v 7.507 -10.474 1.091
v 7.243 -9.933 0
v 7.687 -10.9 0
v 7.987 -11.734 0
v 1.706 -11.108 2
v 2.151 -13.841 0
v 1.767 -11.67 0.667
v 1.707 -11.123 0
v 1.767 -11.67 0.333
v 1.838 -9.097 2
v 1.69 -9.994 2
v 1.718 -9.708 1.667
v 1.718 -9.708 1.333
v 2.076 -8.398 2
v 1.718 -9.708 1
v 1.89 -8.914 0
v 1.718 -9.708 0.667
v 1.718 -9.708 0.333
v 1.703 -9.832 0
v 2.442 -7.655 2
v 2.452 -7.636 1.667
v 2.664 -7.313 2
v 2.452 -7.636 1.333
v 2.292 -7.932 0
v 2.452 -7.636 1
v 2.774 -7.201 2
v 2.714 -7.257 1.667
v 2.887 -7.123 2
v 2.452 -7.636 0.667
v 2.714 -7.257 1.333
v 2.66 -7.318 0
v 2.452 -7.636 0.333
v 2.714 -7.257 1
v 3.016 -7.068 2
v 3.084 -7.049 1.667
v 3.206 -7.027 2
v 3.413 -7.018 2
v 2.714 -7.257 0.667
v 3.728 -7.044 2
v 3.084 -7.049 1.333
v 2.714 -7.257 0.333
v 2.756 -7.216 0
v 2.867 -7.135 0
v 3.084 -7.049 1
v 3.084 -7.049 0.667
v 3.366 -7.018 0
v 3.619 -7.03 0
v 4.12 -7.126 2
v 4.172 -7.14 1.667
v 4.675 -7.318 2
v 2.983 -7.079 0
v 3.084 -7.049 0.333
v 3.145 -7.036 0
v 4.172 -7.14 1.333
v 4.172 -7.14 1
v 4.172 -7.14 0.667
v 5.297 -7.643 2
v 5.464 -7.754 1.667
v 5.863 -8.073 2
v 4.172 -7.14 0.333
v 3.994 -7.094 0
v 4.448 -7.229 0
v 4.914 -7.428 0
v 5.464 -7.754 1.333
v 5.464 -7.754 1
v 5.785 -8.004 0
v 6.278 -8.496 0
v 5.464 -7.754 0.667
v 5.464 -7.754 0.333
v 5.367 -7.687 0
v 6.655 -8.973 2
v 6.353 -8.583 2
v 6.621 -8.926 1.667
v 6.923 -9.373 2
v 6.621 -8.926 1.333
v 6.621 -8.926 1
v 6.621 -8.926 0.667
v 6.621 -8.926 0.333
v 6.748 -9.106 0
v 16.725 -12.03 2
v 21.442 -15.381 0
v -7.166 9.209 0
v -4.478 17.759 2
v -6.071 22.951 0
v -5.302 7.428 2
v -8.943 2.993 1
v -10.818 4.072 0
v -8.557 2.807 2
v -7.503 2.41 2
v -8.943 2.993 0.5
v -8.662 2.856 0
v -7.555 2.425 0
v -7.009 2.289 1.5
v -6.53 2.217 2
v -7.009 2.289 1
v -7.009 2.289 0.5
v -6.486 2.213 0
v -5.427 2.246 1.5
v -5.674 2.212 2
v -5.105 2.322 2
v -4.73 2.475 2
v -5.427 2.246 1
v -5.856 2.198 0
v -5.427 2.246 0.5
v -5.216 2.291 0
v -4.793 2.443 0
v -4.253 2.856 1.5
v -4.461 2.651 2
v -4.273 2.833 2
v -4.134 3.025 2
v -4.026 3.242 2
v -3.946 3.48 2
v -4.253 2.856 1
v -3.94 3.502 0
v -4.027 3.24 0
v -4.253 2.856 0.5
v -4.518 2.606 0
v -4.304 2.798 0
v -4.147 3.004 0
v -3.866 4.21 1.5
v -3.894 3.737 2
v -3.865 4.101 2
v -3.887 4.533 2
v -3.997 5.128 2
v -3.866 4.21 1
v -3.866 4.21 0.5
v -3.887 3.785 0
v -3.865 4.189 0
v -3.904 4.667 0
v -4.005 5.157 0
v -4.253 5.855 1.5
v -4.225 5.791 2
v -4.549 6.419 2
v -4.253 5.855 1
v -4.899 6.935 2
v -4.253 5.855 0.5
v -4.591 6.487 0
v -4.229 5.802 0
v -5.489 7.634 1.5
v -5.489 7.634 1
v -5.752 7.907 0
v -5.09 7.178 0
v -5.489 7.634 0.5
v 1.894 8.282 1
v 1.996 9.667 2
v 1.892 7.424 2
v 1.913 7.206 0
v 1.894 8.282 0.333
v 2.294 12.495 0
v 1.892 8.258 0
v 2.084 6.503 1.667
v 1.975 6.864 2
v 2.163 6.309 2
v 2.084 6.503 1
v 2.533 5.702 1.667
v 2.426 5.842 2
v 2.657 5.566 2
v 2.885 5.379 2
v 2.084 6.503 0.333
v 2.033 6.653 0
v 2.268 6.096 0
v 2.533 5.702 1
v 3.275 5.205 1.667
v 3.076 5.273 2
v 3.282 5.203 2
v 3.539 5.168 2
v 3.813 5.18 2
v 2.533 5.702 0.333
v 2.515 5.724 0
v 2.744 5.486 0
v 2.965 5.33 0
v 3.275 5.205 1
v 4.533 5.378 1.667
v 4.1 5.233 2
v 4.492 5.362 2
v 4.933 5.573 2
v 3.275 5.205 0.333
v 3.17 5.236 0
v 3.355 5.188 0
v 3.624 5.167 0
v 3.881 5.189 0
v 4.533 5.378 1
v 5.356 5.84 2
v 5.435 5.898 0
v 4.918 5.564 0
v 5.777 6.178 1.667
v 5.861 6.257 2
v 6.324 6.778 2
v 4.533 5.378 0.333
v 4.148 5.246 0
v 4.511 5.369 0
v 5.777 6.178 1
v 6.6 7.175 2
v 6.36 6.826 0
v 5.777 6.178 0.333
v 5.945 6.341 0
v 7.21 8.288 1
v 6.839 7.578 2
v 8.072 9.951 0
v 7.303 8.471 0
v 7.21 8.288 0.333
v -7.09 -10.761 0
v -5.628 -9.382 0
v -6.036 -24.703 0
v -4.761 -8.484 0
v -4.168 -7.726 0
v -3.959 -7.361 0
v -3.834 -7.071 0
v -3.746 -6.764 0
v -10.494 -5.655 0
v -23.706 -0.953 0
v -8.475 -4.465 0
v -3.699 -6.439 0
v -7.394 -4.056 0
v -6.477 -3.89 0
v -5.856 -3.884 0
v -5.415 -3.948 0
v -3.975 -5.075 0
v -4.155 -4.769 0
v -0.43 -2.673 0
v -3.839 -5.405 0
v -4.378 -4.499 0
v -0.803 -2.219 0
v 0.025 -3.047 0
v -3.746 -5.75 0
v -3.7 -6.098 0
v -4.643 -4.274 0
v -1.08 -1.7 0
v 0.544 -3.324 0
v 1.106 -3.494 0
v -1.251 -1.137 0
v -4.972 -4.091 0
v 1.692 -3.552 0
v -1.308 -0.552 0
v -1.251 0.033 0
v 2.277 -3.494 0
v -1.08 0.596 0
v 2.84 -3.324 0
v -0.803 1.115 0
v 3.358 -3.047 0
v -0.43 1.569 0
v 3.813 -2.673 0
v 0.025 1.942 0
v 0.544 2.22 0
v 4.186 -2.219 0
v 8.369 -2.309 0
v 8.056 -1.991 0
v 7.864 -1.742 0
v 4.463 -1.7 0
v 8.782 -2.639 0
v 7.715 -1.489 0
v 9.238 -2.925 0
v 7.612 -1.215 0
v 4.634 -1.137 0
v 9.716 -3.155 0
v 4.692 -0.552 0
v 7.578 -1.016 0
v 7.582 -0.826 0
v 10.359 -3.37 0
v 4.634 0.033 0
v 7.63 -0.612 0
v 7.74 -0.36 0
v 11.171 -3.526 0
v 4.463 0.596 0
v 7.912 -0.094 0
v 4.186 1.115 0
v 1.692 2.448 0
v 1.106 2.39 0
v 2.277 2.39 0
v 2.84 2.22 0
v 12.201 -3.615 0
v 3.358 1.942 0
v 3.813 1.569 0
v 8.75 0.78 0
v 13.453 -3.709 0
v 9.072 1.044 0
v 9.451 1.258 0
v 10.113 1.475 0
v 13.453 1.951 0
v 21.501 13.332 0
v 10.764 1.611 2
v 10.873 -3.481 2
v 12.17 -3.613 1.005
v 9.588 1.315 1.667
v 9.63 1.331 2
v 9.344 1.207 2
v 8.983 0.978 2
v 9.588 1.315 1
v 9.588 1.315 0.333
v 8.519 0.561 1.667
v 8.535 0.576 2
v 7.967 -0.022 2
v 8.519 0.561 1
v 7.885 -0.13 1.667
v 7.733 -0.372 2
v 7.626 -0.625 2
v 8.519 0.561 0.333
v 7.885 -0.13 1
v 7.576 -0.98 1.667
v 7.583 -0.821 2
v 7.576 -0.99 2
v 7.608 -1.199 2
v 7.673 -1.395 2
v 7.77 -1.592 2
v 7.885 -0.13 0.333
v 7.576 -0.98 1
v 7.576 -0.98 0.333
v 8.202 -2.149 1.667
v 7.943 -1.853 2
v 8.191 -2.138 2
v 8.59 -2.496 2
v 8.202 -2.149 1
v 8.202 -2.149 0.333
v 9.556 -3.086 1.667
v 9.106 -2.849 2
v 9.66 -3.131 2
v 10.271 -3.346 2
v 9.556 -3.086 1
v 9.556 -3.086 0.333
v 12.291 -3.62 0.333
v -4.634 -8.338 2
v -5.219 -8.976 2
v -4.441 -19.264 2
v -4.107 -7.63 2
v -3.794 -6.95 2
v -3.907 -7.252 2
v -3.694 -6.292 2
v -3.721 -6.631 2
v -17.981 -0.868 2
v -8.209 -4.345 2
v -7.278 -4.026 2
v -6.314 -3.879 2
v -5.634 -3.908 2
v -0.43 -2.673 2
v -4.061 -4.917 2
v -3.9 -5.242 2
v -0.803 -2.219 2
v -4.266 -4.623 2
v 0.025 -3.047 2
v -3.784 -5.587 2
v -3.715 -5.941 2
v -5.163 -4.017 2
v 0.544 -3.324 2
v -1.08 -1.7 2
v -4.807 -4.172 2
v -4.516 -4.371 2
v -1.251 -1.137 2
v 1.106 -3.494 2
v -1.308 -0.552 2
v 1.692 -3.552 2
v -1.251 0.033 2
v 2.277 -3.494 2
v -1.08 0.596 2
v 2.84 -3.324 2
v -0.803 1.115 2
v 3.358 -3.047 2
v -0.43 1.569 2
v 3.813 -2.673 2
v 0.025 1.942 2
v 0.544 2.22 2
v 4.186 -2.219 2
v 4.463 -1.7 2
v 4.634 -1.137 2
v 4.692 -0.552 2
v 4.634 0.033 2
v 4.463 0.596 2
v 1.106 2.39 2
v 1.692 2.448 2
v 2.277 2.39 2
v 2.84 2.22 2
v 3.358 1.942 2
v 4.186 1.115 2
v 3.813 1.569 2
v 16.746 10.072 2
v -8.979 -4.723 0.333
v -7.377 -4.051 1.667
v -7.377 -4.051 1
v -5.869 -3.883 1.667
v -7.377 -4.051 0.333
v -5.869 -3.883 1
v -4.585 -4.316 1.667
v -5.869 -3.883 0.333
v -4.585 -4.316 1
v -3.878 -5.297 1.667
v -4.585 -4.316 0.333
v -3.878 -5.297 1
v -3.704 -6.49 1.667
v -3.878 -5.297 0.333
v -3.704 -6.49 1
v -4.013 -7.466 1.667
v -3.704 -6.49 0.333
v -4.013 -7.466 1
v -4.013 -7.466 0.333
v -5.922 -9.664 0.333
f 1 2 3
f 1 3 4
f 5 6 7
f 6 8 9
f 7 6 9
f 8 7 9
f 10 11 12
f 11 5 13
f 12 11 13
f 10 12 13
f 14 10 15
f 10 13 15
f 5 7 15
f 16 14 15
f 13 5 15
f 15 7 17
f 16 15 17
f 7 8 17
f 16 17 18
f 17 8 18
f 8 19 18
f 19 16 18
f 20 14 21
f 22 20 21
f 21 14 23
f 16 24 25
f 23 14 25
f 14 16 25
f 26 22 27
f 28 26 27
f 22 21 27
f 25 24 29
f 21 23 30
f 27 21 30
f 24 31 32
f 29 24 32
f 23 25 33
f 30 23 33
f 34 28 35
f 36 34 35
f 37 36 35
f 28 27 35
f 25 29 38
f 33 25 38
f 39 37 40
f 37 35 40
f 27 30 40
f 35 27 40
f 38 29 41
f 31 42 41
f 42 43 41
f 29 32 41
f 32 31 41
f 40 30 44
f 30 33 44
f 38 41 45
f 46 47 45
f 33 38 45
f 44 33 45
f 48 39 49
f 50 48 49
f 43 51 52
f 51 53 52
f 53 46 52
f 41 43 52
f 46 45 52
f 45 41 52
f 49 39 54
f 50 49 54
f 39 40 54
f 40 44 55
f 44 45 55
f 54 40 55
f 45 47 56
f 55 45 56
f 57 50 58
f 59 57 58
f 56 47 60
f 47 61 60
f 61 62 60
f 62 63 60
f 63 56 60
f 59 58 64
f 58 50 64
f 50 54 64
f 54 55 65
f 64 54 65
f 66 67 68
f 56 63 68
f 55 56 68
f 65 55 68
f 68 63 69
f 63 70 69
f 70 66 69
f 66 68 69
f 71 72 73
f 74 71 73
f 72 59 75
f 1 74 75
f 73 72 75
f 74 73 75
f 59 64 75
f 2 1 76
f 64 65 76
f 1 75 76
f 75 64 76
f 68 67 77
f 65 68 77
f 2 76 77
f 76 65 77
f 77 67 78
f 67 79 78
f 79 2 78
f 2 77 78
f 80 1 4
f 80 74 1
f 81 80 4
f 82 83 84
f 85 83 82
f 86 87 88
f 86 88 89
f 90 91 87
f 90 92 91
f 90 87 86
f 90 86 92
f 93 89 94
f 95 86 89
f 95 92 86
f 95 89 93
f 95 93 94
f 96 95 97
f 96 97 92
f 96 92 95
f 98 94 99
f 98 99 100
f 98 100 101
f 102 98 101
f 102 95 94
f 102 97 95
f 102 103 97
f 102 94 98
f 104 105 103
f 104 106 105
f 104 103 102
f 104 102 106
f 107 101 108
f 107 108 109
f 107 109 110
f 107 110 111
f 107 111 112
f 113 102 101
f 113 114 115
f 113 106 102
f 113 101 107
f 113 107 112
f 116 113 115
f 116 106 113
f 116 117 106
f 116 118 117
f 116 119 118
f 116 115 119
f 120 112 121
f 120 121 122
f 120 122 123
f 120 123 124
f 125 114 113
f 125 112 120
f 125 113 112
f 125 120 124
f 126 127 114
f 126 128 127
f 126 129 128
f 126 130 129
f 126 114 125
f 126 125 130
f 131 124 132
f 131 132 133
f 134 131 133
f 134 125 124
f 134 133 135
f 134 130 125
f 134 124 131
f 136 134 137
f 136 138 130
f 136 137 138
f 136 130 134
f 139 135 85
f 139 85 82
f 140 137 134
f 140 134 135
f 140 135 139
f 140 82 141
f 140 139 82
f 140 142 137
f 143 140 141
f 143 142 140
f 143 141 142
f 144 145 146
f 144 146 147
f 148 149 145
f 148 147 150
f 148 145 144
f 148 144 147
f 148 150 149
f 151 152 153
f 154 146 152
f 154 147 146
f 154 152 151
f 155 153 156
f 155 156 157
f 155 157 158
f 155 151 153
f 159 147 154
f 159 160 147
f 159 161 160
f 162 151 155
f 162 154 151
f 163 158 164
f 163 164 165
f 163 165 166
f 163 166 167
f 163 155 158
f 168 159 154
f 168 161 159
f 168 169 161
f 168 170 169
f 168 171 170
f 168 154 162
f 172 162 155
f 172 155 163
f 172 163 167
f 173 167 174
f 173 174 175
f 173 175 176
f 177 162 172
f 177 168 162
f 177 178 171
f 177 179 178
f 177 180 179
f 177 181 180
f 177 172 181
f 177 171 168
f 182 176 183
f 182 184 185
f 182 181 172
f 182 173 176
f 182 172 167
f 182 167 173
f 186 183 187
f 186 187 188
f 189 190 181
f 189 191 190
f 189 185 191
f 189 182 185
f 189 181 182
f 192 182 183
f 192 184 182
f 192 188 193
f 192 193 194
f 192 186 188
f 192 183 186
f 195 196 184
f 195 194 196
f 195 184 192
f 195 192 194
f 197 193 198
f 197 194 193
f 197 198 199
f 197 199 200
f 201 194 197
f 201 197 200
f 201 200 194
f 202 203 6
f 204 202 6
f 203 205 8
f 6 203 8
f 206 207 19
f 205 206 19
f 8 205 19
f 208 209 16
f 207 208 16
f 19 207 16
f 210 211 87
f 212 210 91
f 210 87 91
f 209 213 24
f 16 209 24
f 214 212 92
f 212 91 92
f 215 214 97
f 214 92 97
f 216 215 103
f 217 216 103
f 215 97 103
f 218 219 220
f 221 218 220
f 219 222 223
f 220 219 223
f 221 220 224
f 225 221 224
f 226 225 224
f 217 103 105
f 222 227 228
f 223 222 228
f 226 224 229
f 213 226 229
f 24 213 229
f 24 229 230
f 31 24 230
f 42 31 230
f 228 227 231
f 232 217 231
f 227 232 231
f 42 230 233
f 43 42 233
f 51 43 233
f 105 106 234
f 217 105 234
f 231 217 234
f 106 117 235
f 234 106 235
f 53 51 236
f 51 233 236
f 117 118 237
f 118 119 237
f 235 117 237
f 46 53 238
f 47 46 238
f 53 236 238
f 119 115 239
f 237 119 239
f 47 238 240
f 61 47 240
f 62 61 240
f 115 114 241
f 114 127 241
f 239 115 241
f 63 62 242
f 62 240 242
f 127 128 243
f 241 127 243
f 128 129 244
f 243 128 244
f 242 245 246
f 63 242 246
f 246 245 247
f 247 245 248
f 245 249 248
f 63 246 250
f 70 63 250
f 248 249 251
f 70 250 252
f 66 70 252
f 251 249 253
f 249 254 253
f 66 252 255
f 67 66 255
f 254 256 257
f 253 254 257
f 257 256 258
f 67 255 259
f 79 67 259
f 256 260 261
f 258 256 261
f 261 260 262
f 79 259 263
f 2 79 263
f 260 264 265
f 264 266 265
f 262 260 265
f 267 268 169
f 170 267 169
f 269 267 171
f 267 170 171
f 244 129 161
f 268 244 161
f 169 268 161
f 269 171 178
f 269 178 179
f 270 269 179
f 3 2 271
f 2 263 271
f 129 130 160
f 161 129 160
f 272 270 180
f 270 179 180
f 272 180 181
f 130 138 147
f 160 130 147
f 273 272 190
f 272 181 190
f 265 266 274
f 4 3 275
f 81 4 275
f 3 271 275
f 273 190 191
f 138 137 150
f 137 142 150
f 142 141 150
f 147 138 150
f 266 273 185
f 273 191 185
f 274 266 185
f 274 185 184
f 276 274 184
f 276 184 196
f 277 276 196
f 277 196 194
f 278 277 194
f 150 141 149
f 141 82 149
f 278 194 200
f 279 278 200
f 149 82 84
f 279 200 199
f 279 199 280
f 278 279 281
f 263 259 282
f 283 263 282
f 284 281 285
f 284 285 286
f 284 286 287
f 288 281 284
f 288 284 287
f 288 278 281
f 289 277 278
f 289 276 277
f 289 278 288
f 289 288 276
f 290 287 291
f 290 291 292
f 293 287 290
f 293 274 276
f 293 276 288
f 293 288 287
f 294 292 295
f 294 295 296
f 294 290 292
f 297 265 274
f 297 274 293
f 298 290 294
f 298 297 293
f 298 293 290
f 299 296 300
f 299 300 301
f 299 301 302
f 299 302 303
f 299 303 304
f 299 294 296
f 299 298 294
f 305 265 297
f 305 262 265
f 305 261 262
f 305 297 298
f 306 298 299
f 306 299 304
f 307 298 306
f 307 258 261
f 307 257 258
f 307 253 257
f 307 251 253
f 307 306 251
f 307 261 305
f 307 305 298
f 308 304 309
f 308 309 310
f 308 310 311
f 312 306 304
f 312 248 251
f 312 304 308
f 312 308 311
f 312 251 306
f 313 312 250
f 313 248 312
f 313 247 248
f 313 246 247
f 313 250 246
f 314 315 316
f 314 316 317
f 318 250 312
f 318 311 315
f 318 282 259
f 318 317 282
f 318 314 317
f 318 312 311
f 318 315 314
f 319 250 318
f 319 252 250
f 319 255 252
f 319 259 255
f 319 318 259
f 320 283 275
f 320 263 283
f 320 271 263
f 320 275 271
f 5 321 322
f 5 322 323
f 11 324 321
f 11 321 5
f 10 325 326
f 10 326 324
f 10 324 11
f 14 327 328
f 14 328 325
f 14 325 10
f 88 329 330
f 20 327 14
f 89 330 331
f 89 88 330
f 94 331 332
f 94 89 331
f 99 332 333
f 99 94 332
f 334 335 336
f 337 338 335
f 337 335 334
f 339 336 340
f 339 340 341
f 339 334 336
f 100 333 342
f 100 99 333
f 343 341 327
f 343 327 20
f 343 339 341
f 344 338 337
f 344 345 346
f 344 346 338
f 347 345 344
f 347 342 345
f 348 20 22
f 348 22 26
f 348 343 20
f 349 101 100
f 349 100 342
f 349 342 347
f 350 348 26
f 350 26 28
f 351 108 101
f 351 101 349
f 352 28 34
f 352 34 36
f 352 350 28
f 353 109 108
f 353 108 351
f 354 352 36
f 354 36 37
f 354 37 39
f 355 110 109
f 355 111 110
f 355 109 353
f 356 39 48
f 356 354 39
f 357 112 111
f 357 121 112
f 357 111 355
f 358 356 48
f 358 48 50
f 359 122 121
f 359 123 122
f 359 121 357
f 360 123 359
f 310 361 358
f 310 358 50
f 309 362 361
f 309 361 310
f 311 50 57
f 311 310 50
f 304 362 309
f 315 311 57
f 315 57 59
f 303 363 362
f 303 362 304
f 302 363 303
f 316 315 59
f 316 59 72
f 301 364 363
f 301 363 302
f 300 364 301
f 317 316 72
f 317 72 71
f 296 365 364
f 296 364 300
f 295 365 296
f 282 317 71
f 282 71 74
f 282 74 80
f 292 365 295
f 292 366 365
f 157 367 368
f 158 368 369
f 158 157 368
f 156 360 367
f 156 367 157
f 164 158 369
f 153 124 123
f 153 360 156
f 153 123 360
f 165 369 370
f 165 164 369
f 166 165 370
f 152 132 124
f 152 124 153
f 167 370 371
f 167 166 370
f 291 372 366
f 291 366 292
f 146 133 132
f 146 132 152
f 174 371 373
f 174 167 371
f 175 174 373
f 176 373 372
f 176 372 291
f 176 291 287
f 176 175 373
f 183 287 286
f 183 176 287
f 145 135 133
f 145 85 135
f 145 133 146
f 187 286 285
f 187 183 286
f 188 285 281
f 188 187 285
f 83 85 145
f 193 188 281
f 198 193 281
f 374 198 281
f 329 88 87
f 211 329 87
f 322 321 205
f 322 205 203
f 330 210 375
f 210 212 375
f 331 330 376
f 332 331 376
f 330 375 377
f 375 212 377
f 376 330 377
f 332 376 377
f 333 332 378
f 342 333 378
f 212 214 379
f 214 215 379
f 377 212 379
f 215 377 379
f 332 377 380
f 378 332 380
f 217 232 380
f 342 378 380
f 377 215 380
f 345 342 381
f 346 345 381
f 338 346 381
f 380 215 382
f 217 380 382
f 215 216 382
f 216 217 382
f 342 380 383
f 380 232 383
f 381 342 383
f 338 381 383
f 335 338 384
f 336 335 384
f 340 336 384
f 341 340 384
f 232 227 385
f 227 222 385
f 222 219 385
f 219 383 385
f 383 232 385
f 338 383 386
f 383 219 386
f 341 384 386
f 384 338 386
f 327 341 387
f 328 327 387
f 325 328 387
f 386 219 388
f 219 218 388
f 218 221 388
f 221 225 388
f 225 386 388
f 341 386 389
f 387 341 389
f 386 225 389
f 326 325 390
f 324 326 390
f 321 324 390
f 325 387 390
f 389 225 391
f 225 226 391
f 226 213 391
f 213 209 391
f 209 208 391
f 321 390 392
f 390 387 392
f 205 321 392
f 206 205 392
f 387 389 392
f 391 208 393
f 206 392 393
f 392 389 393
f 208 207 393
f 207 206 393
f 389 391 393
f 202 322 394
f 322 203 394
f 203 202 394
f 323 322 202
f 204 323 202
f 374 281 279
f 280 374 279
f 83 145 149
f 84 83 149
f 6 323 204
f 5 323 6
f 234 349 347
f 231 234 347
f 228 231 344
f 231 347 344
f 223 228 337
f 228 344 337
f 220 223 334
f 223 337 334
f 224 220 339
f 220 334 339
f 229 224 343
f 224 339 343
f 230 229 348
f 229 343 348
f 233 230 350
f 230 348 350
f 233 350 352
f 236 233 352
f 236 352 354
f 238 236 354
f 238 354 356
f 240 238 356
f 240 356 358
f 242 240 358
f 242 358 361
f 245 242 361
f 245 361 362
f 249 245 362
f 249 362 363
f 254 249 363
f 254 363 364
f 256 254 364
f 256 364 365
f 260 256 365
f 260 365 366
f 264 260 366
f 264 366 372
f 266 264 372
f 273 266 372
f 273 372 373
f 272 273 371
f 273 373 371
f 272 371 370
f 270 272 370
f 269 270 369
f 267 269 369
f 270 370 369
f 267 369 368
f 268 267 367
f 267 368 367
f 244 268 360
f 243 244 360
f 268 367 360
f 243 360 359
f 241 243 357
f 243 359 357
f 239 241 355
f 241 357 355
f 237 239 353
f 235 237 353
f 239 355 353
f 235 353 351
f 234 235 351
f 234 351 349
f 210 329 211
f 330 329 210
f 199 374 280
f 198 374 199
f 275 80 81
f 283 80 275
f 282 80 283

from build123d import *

# Parameters (mm, degrees)
F1_DEPTH = 2
F2_SIZE  = 1.99999
F4_D     = 6


# Not quite as in the source:
# - a fillet or chamfer is up to 0.001 mm smaller than in the source, because OpenCascade refuses the exact size


with BuildPart() as f1:
    # F0 (on Top) → F1 (new body)
    with BuildSketch(Plane.XY):
        with BuildLine():
            Line((-6.070732047, 22.9513901076), (-7.1661561031, 9.2087939751))
            add(Edge.make_bspline(
                [(-10.8183338371, 4.072241369), (-9.5749830205, 3.3108681768), (-7.3147246833, 1.9267856777), (-3.6193330593, 2.323879706), (-3.8736126343, 6.3110586072), (-5.9992796786, 8.181837424), (-7.1661561031, 9.2087939751)],
                knots=[0, 0, 0, 0, 0.2710094176, 0.4926616748, 0.721498655, 1, 1, 1, 1], degree=3))
            Line((-10.8183338371, 4.072241369), (-23.7063266087, -0.9532651191))
            Line((-23.7063266087, -0.9532651191), (-10.4941075873, -5.6545452478))
            add(Edge.make_bspline(
                [(-10.4941075873, -5.6545452478), (-9.4938612527, -5.0046237284), (-7.5990391104, -3.7734413255), (-4.2858275376, -3.7917280391), (-3.3433653275, -6.5786033893), (-4.5476101592, -8.3403208195), (-5.9073550155, -9.6570884675), (-6.7070025438, -10.4037433444), (-7.0897310874, -10.7611084628)],
                knots=[0, 0, 0, 0, 0.2047671487, 0.3879017737, 0.5554252257, 0.7107538026, 0.8615605352, 1, 1, 1, 1], degree=3))
            Line((-7.0897310874, -10.7611084628), (-6.0359964333, -24.702837204))
            Line((-6.0359964333, -24.702837204), (2.1507161547, -13.8412582744))
            add(Edge.make_bspline(
                [(2.1507161547, -13.8412582744), (1.857437852, -12.3709258177), (1.3508773092, -9.8313161697), (2.3957995803, -7.6684734808), (3.0110019697, -6.7670125475), (5.8159743775, -7.4801379246), (7.4501009355, -10.1557150048), (7.8283613318, -11.2679488073), (7.9867886511, -11.7337872122)],
                knots=[0, 0, 0, 0, 0.2247705341, 0.3882315284, 0.4906474402, 0.664362762, 0.8594245965, 1, 1, 1, 1], degree=3))
            Line((7.9867886511, -11.7337872122), (21.4421775791, -15.3813331802))
            Line((21.4421775791, -15.3813331802), (13.4529346897, -3.7091881875))
            add(Edge.make_bspline(
                [(13.4529346897, 1.9505254996), (11.9323407983, 1.79071702), (9.5330178877, 1.5385575522), (8.581661333, 0.6216498394), (6.8511425341, -1.0519539126), (9.4923390362, -3.4928584716), (12.2268542531, -3.6020610918), (13.107191535, -3.6789793538), (13.4529346897, -3.7091881875)],
                knots=[0, 0, 0, 0, 0.2219857691, 0.3502681055, 0.5009951592, 0.691693444, 0.8789158616, 1, 1, 1, 1], degree=3))
            Line((13.4529346897, 1.9505254996), (21.5007144708, 13.33170683))
            Line((21.5007144708, 13.33170683), (8.0718742184, 9.9506860604))
            add(Edge.make_bspline(
                [(2.294327212, 12.4950657049), (2.1198852992, 10.9346638034), (1.8320041162, 8.3595352793), (1.8961121506, 6.5524820747), (3.1599495173, 4.614552865), (6.0828787964, 6.0160070097), (7.1855048229, 8.2606927811), (7.7920128495, 9.4170893061), (8.0718742184, 9.9506860604)],
                knots=[0, 0, 0, 0, 0.2205766948, 0.364017333, 0.5063227579, 0.6820195585, 0.8532740908, 1, 1, 1, 1], degree=3))
            Line((2.294327212, 12.4950657049), (-6.070732047, 22.9513901076))
        make_face()
    extrude(amount=F1_DEPTH)

    # F2 (size 2 in the source; OpenCascade refuses exactly that, so slightly less here)
    f2_edges = [f1.edges().sort_by_distance(p)[0] for p in [
        (-1.888202, 17.723228, 2),
        (-6.618444, 16.080092, 2),
        (17.476825, 7.641116, 2),
        (14.786294, 11.641196, 2),
        (17.447556, -9.545261, 2),
        (14.714483, -13.55756, 2),
        (-1.94264, -19.272048, 2),
        (-6.562864, -17.731973, 2),
        (-17.100217, -3.303905, 2),
        (-17.26233, 1.559488, 2),
    ]]
    chamfer(f2_edges, length=F2_SIZE)

    # F4 (through all)
    with Locations(Plane(origin=(0, 0, 0), x_dir=(1, 0, 0), z_dir=(0, 0, -1))):
        with Locations((1.6917608845, 0.5521112873)):
            Hole(F4_D / 2)


solid = f1.part
